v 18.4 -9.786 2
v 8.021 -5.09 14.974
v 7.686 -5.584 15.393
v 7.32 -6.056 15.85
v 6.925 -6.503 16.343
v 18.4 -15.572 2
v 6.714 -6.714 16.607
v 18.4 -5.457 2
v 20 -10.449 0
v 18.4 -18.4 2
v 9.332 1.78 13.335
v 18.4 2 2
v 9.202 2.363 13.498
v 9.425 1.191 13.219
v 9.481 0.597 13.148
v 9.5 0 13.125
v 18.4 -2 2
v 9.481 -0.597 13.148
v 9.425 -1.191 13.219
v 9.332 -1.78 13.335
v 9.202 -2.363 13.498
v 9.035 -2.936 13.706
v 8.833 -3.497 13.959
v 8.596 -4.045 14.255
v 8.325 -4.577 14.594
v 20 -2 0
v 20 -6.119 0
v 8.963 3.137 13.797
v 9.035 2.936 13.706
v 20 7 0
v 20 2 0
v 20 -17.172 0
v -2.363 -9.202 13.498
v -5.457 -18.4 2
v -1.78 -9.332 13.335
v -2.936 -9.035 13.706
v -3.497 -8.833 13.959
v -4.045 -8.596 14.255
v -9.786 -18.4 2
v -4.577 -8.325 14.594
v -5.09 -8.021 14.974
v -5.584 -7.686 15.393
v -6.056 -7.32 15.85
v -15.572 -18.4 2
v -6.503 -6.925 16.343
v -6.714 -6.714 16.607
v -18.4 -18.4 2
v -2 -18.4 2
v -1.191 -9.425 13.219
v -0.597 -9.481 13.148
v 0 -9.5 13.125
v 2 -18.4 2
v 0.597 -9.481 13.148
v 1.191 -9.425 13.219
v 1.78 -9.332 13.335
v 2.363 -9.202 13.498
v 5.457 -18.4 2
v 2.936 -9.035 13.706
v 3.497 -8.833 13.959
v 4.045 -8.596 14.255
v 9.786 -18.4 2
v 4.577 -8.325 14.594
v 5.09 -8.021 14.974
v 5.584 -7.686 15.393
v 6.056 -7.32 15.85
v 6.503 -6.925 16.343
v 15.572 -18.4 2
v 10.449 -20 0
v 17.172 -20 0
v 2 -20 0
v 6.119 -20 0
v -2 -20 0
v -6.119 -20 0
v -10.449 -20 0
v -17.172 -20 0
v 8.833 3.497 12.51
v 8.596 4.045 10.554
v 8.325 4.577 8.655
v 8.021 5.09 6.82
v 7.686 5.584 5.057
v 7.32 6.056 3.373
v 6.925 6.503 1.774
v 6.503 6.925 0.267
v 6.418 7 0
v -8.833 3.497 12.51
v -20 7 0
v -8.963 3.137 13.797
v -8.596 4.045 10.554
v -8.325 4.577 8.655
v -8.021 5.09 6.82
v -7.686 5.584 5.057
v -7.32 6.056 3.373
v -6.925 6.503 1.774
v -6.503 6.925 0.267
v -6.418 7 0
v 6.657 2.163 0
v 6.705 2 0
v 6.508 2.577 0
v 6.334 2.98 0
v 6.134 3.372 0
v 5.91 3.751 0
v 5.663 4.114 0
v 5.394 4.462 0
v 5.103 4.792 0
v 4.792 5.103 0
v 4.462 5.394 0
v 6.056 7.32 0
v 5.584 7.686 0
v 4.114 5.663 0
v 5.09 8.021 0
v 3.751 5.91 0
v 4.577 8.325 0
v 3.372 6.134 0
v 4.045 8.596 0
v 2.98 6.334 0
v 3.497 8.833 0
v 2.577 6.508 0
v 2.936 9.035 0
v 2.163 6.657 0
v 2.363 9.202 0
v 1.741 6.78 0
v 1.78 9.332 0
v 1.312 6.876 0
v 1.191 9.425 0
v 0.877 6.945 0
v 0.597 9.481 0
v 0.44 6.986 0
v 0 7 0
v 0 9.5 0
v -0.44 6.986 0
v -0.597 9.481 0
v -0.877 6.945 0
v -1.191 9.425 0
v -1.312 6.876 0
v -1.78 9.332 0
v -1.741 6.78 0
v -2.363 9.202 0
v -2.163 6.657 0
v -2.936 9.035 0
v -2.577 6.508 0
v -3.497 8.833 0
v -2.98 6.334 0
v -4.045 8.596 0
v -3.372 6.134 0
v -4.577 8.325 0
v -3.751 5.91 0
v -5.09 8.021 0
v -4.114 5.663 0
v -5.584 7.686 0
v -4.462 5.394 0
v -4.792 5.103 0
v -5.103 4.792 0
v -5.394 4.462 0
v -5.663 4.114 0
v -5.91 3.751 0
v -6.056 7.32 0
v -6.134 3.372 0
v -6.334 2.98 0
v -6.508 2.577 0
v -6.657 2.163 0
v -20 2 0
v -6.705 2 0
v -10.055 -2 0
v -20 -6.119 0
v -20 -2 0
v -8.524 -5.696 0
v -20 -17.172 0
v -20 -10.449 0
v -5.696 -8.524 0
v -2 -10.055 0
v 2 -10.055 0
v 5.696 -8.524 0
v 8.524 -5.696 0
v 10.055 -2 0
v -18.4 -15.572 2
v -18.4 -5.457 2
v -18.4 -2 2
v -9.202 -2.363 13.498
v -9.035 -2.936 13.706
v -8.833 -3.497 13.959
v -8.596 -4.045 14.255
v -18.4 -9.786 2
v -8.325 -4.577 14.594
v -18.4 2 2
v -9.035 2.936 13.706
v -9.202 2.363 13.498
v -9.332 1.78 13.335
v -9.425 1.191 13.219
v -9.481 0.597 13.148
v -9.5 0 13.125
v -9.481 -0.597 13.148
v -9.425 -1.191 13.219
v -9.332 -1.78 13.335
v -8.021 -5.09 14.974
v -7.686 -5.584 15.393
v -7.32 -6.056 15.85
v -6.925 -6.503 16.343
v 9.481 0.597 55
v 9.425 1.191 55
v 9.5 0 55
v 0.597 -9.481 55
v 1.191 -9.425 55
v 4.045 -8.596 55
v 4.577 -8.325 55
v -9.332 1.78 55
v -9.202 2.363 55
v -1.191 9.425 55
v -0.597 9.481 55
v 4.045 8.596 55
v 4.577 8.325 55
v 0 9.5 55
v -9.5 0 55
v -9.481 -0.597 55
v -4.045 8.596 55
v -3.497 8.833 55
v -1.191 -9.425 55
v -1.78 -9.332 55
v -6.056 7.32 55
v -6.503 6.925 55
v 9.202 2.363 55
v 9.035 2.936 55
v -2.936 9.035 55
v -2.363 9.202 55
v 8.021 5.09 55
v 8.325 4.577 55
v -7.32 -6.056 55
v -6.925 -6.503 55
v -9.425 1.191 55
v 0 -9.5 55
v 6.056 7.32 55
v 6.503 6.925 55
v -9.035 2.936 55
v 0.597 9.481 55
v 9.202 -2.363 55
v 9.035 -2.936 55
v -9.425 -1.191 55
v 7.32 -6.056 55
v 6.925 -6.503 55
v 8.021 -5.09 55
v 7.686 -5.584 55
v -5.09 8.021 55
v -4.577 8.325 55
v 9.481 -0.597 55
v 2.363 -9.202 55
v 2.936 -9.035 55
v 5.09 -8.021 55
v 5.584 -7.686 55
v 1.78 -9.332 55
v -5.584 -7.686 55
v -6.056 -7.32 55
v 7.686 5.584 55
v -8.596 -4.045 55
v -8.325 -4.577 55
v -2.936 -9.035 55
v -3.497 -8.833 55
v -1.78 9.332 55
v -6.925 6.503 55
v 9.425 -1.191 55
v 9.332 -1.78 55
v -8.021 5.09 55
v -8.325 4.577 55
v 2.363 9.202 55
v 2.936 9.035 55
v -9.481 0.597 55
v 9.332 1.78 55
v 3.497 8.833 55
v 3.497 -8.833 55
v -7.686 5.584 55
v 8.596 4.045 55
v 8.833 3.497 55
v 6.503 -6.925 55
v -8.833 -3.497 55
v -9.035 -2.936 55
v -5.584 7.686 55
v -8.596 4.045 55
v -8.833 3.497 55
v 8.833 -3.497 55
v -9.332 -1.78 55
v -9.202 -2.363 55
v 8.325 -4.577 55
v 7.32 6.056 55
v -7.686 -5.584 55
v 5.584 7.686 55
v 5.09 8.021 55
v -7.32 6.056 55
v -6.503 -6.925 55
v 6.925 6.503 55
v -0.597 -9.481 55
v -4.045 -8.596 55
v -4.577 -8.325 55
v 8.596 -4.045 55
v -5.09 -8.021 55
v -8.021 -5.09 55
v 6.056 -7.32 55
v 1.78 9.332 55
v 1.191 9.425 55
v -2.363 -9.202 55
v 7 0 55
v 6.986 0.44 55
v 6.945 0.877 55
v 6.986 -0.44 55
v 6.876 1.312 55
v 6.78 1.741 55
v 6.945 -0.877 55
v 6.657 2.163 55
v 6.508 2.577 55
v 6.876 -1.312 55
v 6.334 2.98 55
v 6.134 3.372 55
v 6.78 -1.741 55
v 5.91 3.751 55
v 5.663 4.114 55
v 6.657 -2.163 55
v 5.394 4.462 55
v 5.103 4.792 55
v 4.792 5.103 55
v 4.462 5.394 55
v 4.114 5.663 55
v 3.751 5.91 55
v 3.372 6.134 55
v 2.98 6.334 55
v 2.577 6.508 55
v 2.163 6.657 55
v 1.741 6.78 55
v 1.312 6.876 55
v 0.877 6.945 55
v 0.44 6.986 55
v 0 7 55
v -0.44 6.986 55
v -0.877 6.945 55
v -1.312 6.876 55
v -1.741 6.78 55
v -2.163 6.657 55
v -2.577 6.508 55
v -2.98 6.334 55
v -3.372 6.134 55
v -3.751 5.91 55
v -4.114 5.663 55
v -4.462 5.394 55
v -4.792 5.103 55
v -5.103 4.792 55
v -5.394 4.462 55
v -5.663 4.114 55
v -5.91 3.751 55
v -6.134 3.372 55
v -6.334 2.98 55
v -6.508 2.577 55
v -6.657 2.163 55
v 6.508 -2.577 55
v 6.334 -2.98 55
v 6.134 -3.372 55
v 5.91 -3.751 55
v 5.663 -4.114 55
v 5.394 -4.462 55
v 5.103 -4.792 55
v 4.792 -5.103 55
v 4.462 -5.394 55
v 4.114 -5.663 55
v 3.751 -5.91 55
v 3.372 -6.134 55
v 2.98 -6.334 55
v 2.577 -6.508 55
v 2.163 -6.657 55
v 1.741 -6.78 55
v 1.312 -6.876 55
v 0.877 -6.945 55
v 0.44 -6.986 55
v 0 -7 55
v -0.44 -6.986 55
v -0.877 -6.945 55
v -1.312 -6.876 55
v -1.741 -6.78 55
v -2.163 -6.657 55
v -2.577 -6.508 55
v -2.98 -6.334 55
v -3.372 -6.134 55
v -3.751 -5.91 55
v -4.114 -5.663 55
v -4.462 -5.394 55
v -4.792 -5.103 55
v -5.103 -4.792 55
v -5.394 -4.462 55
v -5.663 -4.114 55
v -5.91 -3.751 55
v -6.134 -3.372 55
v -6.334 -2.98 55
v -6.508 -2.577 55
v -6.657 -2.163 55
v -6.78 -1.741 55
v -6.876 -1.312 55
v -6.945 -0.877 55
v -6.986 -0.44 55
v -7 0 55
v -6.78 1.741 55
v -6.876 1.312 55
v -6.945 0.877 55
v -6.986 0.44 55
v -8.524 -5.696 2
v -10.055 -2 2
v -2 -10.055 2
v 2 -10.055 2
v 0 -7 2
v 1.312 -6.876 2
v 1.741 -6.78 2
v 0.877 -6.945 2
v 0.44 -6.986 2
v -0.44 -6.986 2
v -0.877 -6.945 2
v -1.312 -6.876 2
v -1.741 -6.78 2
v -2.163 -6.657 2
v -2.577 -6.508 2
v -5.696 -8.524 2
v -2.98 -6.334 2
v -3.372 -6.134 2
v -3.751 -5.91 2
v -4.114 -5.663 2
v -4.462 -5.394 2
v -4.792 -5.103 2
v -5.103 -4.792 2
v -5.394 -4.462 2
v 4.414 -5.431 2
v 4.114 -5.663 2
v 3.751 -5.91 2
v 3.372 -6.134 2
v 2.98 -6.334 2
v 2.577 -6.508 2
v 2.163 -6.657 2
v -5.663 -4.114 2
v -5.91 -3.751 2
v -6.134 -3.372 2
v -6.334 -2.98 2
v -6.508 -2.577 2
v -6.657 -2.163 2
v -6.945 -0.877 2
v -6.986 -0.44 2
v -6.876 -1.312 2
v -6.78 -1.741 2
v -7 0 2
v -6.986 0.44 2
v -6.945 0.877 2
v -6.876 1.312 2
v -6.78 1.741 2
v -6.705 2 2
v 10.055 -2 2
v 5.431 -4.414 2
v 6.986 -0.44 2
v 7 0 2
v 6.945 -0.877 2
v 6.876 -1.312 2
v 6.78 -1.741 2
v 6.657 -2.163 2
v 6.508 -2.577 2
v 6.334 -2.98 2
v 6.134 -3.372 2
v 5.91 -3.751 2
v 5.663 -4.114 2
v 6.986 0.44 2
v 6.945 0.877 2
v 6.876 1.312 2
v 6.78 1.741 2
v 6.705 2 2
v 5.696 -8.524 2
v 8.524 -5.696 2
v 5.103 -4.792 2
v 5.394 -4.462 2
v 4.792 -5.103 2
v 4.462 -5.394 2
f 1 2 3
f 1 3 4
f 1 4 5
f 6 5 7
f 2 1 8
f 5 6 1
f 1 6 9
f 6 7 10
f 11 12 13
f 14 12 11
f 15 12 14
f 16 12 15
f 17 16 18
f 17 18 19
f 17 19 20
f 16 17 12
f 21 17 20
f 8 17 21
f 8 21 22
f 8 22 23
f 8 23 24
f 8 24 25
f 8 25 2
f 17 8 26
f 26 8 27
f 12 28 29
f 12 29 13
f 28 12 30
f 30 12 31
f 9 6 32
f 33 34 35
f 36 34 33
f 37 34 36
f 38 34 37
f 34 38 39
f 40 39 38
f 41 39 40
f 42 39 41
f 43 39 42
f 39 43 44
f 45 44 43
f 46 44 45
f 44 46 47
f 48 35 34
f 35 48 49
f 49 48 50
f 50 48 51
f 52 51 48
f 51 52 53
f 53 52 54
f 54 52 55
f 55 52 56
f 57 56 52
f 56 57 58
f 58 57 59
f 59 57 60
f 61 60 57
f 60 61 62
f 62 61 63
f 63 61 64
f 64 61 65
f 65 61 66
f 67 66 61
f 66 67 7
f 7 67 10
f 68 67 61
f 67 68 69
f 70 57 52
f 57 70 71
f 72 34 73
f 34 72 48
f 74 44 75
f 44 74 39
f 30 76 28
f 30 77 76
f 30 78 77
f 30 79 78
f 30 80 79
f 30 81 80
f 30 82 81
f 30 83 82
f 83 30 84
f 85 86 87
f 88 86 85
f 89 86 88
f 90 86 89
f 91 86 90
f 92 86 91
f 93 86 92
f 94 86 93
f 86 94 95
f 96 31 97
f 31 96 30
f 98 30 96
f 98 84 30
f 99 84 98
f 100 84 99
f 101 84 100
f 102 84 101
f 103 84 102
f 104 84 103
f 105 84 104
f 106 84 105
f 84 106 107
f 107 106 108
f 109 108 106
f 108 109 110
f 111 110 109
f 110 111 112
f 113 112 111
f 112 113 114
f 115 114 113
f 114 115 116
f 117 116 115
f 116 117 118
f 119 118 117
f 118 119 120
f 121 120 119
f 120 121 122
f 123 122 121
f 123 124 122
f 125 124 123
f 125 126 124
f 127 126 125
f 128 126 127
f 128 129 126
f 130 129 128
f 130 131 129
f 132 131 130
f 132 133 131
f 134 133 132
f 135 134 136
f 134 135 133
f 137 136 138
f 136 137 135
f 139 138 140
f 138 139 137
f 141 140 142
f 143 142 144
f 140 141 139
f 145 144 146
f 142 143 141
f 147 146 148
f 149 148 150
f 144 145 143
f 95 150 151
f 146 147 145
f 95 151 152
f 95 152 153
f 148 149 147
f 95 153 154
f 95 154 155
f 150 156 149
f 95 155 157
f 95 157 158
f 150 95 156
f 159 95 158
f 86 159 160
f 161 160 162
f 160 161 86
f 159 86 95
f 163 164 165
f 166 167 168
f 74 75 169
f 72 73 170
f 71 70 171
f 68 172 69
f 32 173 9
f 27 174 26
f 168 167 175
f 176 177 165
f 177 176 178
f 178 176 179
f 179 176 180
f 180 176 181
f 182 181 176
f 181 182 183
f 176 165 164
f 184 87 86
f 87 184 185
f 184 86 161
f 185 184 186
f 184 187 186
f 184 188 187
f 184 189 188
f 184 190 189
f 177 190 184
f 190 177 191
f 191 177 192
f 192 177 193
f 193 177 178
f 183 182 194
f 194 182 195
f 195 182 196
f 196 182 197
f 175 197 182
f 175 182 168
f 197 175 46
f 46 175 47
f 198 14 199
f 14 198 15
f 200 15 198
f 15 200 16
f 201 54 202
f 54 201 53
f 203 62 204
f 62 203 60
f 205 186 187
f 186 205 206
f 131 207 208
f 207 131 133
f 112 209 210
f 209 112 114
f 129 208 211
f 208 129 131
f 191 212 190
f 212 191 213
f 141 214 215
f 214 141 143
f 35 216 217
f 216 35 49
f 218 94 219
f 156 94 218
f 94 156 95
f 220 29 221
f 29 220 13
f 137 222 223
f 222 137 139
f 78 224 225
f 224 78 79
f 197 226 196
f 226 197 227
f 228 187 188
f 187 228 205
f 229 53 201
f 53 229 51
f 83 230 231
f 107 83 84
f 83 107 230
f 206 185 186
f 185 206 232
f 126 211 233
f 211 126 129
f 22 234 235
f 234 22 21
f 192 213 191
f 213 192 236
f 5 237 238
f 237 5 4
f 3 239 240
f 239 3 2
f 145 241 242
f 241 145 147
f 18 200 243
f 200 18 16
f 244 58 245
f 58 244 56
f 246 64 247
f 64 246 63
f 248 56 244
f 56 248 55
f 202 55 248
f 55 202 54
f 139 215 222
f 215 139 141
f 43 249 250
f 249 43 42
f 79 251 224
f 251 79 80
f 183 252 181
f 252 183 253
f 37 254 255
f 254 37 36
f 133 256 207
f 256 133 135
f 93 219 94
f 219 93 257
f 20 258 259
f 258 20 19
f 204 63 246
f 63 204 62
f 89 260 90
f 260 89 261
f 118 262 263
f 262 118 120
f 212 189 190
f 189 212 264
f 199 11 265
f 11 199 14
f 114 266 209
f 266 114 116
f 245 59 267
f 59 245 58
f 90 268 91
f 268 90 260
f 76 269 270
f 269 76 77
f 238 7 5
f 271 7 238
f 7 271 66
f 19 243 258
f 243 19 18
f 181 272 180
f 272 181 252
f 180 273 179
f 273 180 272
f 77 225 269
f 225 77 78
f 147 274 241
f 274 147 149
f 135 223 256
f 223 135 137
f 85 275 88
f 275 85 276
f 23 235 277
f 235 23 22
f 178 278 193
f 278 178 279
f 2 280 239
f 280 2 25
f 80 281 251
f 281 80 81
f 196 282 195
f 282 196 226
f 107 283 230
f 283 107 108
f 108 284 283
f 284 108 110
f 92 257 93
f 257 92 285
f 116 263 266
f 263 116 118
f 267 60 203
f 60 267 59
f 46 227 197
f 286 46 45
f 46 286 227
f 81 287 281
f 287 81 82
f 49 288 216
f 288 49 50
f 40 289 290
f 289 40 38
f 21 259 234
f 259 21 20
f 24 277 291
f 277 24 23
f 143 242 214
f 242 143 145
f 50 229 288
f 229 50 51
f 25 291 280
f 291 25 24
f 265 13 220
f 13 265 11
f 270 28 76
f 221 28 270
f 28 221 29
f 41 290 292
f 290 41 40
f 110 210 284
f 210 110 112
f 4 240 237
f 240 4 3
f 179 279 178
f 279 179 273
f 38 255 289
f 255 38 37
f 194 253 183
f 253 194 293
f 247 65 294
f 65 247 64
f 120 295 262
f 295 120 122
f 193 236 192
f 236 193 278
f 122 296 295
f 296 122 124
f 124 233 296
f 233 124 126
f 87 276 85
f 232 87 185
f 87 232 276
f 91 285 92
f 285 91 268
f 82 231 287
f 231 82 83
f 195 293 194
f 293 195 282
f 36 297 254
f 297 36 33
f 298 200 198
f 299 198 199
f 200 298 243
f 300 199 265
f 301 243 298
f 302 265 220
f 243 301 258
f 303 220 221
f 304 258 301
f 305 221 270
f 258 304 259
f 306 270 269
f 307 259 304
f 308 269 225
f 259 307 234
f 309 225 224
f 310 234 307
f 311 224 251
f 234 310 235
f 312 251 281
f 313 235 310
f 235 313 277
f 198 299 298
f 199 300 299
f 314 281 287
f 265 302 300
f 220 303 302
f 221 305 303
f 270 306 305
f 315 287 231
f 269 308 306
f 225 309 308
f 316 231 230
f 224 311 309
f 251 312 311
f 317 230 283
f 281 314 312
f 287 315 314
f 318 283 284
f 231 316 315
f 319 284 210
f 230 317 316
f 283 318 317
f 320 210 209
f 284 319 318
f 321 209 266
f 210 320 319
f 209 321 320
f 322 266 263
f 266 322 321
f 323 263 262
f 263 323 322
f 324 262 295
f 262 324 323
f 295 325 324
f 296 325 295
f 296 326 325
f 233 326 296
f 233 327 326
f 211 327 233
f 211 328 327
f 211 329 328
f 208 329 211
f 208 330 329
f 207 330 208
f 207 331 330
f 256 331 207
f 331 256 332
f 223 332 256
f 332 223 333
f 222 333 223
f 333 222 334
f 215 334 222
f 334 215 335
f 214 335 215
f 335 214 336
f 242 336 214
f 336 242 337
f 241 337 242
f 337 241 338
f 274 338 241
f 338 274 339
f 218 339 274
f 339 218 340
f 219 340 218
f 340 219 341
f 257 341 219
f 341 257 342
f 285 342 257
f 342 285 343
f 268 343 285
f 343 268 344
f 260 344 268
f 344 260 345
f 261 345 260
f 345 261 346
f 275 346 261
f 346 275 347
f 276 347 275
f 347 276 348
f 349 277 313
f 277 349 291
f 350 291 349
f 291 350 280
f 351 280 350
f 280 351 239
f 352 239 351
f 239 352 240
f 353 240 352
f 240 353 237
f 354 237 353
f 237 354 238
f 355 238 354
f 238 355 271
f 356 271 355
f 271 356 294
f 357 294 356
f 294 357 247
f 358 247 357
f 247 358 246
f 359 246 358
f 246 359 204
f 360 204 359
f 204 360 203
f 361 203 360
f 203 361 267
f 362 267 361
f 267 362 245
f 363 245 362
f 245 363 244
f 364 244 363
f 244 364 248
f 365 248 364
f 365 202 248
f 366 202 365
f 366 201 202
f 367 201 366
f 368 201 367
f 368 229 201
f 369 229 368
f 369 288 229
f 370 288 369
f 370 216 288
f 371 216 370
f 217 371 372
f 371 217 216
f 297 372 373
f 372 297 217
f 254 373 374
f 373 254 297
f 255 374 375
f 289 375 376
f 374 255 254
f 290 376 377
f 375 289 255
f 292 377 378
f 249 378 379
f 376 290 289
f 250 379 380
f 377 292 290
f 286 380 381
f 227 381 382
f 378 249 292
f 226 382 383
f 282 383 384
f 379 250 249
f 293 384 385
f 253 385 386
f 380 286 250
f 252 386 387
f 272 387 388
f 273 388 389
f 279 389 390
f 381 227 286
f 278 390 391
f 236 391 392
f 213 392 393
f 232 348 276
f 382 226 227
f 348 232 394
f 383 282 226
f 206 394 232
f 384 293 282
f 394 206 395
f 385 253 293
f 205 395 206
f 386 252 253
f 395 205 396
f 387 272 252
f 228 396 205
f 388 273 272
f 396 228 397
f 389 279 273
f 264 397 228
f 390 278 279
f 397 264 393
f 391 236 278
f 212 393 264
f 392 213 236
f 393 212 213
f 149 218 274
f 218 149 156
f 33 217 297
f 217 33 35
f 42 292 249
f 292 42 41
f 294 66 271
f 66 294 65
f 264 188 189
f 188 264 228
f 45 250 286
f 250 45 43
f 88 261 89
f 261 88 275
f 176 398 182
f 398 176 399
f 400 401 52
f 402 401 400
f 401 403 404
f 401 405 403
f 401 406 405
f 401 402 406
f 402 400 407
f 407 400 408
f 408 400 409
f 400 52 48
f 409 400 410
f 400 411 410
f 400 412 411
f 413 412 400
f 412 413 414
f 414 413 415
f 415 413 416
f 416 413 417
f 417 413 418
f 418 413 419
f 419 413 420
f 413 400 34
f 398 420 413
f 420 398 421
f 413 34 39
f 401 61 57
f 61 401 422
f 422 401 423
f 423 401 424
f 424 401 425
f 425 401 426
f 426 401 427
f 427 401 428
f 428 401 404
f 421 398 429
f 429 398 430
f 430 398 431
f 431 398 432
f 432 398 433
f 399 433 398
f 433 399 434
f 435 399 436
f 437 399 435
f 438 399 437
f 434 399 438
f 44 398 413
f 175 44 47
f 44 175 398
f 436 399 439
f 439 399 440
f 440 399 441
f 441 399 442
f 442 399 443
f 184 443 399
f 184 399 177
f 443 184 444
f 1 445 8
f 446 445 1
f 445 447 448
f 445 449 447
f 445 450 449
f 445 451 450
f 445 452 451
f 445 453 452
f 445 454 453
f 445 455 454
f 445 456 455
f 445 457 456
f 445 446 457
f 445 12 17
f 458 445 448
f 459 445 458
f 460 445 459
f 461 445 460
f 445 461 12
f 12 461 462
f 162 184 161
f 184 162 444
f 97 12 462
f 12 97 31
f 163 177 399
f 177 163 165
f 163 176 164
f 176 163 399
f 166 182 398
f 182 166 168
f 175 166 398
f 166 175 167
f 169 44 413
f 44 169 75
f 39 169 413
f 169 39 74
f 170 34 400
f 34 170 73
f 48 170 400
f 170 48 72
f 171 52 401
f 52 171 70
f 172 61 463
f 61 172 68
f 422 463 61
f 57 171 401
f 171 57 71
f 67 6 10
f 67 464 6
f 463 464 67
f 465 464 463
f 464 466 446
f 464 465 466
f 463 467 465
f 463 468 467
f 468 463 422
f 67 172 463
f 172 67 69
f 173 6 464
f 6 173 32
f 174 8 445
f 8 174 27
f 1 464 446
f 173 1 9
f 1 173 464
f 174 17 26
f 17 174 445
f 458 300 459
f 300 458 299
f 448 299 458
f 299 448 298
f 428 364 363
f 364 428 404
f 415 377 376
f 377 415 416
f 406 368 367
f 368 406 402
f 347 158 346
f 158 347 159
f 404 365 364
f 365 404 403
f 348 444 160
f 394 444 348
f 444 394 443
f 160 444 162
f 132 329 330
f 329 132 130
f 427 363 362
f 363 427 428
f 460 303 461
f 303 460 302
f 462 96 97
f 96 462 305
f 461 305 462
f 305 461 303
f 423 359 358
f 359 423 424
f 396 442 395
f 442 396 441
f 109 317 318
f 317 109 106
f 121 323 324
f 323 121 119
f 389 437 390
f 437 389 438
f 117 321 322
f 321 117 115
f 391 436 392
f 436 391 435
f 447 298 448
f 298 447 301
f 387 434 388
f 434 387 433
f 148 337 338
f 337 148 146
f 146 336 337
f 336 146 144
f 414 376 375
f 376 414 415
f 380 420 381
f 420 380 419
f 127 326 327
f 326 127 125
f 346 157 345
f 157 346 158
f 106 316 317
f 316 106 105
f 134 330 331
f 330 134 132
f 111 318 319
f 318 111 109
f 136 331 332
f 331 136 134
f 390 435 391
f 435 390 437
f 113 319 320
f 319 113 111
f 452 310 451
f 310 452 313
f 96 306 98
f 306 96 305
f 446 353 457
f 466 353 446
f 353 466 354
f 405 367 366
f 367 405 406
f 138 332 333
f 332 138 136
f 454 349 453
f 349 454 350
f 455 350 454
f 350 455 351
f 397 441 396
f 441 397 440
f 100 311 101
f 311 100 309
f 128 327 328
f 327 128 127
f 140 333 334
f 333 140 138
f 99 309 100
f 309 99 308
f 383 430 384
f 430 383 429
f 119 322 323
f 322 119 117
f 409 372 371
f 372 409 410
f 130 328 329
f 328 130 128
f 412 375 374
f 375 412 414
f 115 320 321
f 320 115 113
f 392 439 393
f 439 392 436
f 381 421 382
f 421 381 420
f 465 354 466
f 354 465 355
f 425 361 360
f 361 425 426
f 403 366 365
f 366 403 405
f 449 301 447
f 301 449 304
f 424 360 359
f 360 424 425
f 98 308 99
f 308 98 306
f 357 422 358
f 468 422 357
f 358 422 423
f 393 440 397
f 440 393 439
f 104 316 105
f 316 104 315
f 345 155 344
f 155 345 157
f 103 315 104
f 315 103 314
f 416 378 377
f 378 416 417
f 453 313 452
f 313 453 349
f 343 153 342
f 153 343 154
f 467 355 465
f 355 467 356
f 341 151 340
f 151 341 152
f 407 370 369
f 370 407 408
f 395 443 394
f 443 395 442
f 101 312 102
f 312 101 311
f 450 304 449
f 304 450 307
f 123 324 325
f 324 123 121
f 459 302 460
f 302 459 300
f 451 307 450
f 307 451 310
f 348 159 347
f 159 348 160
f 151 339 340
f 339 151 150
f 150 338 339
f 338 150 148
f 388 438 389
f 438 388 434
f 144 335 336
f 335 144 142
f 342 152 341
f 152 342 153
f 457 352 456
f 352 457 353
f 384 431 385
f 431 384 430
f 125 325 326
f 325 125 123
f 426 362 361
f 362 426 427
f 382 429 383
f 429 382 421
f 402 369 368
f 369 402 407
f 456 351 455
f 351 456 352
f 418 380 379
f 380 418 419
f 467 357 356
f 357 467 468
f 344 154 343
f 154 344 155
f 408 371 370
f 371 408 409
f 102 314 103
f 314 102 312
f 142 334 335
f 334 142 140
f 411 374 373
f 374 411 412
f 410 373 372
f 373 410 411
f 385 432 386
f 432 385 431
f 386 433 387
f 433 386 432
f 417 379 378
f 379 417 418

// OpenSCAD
/*
4/24/2020
Changed pyramid points, replaced side => 7.
Changed rotate from 360 to 180.
Changed pyramidside = 30 => 20
changed pyramidheight = 30 => 25
*/

$fn=100;


difference()
{
    // drain_attachment(30,30,19,55);
    drain_attachment(pyramidside = 20, pyramidheight = 25, attachmentOD = 19, attachmentLength = 55);
    //translate([0,0,2.5])
    spokes(diameter = 14, spokelength = 75, spokewidth = 4, spokenumber = 8);
}


module drain_attachment(pyramidside, pyramidheight, attachmentOD, attachmentLength)
{
    pyramid(pyramidside,pyramidheight);
    translate([0,0,attachmentLength/2])
    cylinder(h=attachmentLength,r=attachmentOD/2,center=true);
}

module spokes( diameter, spokelength, spokewidth, spokenumber ) {

	union() {
		cylinder( h=spokewidth*30, r= diameter/2, center = true ); 

		for (step = [0:spokenumber]) {
		    rotate( a = step*(180/spokenumber), v=[0, 0, 1])
		spoke( spokelength, spokewidth );
            //echo(step);
		}
	}

}

/*
Single spoke used in Spokes()
*/
module spoke( length, width ) {
	translate ( [-length/2, 0, 0] )
	cube( [length, width, width], center=true); 
}

module pyramid(side, height)
{
    points = [
        [side,7,0],
        [side, -side,0],
        [-side,-side,0],
        [-side,7,0],
        [0,0,height]];
    
    faces=[[0,1,4],[1,2,4],[2,3,4],[3,0,4],[1,0,3],[2,1,3]];
    
    polyhedron(points,faces);
}
